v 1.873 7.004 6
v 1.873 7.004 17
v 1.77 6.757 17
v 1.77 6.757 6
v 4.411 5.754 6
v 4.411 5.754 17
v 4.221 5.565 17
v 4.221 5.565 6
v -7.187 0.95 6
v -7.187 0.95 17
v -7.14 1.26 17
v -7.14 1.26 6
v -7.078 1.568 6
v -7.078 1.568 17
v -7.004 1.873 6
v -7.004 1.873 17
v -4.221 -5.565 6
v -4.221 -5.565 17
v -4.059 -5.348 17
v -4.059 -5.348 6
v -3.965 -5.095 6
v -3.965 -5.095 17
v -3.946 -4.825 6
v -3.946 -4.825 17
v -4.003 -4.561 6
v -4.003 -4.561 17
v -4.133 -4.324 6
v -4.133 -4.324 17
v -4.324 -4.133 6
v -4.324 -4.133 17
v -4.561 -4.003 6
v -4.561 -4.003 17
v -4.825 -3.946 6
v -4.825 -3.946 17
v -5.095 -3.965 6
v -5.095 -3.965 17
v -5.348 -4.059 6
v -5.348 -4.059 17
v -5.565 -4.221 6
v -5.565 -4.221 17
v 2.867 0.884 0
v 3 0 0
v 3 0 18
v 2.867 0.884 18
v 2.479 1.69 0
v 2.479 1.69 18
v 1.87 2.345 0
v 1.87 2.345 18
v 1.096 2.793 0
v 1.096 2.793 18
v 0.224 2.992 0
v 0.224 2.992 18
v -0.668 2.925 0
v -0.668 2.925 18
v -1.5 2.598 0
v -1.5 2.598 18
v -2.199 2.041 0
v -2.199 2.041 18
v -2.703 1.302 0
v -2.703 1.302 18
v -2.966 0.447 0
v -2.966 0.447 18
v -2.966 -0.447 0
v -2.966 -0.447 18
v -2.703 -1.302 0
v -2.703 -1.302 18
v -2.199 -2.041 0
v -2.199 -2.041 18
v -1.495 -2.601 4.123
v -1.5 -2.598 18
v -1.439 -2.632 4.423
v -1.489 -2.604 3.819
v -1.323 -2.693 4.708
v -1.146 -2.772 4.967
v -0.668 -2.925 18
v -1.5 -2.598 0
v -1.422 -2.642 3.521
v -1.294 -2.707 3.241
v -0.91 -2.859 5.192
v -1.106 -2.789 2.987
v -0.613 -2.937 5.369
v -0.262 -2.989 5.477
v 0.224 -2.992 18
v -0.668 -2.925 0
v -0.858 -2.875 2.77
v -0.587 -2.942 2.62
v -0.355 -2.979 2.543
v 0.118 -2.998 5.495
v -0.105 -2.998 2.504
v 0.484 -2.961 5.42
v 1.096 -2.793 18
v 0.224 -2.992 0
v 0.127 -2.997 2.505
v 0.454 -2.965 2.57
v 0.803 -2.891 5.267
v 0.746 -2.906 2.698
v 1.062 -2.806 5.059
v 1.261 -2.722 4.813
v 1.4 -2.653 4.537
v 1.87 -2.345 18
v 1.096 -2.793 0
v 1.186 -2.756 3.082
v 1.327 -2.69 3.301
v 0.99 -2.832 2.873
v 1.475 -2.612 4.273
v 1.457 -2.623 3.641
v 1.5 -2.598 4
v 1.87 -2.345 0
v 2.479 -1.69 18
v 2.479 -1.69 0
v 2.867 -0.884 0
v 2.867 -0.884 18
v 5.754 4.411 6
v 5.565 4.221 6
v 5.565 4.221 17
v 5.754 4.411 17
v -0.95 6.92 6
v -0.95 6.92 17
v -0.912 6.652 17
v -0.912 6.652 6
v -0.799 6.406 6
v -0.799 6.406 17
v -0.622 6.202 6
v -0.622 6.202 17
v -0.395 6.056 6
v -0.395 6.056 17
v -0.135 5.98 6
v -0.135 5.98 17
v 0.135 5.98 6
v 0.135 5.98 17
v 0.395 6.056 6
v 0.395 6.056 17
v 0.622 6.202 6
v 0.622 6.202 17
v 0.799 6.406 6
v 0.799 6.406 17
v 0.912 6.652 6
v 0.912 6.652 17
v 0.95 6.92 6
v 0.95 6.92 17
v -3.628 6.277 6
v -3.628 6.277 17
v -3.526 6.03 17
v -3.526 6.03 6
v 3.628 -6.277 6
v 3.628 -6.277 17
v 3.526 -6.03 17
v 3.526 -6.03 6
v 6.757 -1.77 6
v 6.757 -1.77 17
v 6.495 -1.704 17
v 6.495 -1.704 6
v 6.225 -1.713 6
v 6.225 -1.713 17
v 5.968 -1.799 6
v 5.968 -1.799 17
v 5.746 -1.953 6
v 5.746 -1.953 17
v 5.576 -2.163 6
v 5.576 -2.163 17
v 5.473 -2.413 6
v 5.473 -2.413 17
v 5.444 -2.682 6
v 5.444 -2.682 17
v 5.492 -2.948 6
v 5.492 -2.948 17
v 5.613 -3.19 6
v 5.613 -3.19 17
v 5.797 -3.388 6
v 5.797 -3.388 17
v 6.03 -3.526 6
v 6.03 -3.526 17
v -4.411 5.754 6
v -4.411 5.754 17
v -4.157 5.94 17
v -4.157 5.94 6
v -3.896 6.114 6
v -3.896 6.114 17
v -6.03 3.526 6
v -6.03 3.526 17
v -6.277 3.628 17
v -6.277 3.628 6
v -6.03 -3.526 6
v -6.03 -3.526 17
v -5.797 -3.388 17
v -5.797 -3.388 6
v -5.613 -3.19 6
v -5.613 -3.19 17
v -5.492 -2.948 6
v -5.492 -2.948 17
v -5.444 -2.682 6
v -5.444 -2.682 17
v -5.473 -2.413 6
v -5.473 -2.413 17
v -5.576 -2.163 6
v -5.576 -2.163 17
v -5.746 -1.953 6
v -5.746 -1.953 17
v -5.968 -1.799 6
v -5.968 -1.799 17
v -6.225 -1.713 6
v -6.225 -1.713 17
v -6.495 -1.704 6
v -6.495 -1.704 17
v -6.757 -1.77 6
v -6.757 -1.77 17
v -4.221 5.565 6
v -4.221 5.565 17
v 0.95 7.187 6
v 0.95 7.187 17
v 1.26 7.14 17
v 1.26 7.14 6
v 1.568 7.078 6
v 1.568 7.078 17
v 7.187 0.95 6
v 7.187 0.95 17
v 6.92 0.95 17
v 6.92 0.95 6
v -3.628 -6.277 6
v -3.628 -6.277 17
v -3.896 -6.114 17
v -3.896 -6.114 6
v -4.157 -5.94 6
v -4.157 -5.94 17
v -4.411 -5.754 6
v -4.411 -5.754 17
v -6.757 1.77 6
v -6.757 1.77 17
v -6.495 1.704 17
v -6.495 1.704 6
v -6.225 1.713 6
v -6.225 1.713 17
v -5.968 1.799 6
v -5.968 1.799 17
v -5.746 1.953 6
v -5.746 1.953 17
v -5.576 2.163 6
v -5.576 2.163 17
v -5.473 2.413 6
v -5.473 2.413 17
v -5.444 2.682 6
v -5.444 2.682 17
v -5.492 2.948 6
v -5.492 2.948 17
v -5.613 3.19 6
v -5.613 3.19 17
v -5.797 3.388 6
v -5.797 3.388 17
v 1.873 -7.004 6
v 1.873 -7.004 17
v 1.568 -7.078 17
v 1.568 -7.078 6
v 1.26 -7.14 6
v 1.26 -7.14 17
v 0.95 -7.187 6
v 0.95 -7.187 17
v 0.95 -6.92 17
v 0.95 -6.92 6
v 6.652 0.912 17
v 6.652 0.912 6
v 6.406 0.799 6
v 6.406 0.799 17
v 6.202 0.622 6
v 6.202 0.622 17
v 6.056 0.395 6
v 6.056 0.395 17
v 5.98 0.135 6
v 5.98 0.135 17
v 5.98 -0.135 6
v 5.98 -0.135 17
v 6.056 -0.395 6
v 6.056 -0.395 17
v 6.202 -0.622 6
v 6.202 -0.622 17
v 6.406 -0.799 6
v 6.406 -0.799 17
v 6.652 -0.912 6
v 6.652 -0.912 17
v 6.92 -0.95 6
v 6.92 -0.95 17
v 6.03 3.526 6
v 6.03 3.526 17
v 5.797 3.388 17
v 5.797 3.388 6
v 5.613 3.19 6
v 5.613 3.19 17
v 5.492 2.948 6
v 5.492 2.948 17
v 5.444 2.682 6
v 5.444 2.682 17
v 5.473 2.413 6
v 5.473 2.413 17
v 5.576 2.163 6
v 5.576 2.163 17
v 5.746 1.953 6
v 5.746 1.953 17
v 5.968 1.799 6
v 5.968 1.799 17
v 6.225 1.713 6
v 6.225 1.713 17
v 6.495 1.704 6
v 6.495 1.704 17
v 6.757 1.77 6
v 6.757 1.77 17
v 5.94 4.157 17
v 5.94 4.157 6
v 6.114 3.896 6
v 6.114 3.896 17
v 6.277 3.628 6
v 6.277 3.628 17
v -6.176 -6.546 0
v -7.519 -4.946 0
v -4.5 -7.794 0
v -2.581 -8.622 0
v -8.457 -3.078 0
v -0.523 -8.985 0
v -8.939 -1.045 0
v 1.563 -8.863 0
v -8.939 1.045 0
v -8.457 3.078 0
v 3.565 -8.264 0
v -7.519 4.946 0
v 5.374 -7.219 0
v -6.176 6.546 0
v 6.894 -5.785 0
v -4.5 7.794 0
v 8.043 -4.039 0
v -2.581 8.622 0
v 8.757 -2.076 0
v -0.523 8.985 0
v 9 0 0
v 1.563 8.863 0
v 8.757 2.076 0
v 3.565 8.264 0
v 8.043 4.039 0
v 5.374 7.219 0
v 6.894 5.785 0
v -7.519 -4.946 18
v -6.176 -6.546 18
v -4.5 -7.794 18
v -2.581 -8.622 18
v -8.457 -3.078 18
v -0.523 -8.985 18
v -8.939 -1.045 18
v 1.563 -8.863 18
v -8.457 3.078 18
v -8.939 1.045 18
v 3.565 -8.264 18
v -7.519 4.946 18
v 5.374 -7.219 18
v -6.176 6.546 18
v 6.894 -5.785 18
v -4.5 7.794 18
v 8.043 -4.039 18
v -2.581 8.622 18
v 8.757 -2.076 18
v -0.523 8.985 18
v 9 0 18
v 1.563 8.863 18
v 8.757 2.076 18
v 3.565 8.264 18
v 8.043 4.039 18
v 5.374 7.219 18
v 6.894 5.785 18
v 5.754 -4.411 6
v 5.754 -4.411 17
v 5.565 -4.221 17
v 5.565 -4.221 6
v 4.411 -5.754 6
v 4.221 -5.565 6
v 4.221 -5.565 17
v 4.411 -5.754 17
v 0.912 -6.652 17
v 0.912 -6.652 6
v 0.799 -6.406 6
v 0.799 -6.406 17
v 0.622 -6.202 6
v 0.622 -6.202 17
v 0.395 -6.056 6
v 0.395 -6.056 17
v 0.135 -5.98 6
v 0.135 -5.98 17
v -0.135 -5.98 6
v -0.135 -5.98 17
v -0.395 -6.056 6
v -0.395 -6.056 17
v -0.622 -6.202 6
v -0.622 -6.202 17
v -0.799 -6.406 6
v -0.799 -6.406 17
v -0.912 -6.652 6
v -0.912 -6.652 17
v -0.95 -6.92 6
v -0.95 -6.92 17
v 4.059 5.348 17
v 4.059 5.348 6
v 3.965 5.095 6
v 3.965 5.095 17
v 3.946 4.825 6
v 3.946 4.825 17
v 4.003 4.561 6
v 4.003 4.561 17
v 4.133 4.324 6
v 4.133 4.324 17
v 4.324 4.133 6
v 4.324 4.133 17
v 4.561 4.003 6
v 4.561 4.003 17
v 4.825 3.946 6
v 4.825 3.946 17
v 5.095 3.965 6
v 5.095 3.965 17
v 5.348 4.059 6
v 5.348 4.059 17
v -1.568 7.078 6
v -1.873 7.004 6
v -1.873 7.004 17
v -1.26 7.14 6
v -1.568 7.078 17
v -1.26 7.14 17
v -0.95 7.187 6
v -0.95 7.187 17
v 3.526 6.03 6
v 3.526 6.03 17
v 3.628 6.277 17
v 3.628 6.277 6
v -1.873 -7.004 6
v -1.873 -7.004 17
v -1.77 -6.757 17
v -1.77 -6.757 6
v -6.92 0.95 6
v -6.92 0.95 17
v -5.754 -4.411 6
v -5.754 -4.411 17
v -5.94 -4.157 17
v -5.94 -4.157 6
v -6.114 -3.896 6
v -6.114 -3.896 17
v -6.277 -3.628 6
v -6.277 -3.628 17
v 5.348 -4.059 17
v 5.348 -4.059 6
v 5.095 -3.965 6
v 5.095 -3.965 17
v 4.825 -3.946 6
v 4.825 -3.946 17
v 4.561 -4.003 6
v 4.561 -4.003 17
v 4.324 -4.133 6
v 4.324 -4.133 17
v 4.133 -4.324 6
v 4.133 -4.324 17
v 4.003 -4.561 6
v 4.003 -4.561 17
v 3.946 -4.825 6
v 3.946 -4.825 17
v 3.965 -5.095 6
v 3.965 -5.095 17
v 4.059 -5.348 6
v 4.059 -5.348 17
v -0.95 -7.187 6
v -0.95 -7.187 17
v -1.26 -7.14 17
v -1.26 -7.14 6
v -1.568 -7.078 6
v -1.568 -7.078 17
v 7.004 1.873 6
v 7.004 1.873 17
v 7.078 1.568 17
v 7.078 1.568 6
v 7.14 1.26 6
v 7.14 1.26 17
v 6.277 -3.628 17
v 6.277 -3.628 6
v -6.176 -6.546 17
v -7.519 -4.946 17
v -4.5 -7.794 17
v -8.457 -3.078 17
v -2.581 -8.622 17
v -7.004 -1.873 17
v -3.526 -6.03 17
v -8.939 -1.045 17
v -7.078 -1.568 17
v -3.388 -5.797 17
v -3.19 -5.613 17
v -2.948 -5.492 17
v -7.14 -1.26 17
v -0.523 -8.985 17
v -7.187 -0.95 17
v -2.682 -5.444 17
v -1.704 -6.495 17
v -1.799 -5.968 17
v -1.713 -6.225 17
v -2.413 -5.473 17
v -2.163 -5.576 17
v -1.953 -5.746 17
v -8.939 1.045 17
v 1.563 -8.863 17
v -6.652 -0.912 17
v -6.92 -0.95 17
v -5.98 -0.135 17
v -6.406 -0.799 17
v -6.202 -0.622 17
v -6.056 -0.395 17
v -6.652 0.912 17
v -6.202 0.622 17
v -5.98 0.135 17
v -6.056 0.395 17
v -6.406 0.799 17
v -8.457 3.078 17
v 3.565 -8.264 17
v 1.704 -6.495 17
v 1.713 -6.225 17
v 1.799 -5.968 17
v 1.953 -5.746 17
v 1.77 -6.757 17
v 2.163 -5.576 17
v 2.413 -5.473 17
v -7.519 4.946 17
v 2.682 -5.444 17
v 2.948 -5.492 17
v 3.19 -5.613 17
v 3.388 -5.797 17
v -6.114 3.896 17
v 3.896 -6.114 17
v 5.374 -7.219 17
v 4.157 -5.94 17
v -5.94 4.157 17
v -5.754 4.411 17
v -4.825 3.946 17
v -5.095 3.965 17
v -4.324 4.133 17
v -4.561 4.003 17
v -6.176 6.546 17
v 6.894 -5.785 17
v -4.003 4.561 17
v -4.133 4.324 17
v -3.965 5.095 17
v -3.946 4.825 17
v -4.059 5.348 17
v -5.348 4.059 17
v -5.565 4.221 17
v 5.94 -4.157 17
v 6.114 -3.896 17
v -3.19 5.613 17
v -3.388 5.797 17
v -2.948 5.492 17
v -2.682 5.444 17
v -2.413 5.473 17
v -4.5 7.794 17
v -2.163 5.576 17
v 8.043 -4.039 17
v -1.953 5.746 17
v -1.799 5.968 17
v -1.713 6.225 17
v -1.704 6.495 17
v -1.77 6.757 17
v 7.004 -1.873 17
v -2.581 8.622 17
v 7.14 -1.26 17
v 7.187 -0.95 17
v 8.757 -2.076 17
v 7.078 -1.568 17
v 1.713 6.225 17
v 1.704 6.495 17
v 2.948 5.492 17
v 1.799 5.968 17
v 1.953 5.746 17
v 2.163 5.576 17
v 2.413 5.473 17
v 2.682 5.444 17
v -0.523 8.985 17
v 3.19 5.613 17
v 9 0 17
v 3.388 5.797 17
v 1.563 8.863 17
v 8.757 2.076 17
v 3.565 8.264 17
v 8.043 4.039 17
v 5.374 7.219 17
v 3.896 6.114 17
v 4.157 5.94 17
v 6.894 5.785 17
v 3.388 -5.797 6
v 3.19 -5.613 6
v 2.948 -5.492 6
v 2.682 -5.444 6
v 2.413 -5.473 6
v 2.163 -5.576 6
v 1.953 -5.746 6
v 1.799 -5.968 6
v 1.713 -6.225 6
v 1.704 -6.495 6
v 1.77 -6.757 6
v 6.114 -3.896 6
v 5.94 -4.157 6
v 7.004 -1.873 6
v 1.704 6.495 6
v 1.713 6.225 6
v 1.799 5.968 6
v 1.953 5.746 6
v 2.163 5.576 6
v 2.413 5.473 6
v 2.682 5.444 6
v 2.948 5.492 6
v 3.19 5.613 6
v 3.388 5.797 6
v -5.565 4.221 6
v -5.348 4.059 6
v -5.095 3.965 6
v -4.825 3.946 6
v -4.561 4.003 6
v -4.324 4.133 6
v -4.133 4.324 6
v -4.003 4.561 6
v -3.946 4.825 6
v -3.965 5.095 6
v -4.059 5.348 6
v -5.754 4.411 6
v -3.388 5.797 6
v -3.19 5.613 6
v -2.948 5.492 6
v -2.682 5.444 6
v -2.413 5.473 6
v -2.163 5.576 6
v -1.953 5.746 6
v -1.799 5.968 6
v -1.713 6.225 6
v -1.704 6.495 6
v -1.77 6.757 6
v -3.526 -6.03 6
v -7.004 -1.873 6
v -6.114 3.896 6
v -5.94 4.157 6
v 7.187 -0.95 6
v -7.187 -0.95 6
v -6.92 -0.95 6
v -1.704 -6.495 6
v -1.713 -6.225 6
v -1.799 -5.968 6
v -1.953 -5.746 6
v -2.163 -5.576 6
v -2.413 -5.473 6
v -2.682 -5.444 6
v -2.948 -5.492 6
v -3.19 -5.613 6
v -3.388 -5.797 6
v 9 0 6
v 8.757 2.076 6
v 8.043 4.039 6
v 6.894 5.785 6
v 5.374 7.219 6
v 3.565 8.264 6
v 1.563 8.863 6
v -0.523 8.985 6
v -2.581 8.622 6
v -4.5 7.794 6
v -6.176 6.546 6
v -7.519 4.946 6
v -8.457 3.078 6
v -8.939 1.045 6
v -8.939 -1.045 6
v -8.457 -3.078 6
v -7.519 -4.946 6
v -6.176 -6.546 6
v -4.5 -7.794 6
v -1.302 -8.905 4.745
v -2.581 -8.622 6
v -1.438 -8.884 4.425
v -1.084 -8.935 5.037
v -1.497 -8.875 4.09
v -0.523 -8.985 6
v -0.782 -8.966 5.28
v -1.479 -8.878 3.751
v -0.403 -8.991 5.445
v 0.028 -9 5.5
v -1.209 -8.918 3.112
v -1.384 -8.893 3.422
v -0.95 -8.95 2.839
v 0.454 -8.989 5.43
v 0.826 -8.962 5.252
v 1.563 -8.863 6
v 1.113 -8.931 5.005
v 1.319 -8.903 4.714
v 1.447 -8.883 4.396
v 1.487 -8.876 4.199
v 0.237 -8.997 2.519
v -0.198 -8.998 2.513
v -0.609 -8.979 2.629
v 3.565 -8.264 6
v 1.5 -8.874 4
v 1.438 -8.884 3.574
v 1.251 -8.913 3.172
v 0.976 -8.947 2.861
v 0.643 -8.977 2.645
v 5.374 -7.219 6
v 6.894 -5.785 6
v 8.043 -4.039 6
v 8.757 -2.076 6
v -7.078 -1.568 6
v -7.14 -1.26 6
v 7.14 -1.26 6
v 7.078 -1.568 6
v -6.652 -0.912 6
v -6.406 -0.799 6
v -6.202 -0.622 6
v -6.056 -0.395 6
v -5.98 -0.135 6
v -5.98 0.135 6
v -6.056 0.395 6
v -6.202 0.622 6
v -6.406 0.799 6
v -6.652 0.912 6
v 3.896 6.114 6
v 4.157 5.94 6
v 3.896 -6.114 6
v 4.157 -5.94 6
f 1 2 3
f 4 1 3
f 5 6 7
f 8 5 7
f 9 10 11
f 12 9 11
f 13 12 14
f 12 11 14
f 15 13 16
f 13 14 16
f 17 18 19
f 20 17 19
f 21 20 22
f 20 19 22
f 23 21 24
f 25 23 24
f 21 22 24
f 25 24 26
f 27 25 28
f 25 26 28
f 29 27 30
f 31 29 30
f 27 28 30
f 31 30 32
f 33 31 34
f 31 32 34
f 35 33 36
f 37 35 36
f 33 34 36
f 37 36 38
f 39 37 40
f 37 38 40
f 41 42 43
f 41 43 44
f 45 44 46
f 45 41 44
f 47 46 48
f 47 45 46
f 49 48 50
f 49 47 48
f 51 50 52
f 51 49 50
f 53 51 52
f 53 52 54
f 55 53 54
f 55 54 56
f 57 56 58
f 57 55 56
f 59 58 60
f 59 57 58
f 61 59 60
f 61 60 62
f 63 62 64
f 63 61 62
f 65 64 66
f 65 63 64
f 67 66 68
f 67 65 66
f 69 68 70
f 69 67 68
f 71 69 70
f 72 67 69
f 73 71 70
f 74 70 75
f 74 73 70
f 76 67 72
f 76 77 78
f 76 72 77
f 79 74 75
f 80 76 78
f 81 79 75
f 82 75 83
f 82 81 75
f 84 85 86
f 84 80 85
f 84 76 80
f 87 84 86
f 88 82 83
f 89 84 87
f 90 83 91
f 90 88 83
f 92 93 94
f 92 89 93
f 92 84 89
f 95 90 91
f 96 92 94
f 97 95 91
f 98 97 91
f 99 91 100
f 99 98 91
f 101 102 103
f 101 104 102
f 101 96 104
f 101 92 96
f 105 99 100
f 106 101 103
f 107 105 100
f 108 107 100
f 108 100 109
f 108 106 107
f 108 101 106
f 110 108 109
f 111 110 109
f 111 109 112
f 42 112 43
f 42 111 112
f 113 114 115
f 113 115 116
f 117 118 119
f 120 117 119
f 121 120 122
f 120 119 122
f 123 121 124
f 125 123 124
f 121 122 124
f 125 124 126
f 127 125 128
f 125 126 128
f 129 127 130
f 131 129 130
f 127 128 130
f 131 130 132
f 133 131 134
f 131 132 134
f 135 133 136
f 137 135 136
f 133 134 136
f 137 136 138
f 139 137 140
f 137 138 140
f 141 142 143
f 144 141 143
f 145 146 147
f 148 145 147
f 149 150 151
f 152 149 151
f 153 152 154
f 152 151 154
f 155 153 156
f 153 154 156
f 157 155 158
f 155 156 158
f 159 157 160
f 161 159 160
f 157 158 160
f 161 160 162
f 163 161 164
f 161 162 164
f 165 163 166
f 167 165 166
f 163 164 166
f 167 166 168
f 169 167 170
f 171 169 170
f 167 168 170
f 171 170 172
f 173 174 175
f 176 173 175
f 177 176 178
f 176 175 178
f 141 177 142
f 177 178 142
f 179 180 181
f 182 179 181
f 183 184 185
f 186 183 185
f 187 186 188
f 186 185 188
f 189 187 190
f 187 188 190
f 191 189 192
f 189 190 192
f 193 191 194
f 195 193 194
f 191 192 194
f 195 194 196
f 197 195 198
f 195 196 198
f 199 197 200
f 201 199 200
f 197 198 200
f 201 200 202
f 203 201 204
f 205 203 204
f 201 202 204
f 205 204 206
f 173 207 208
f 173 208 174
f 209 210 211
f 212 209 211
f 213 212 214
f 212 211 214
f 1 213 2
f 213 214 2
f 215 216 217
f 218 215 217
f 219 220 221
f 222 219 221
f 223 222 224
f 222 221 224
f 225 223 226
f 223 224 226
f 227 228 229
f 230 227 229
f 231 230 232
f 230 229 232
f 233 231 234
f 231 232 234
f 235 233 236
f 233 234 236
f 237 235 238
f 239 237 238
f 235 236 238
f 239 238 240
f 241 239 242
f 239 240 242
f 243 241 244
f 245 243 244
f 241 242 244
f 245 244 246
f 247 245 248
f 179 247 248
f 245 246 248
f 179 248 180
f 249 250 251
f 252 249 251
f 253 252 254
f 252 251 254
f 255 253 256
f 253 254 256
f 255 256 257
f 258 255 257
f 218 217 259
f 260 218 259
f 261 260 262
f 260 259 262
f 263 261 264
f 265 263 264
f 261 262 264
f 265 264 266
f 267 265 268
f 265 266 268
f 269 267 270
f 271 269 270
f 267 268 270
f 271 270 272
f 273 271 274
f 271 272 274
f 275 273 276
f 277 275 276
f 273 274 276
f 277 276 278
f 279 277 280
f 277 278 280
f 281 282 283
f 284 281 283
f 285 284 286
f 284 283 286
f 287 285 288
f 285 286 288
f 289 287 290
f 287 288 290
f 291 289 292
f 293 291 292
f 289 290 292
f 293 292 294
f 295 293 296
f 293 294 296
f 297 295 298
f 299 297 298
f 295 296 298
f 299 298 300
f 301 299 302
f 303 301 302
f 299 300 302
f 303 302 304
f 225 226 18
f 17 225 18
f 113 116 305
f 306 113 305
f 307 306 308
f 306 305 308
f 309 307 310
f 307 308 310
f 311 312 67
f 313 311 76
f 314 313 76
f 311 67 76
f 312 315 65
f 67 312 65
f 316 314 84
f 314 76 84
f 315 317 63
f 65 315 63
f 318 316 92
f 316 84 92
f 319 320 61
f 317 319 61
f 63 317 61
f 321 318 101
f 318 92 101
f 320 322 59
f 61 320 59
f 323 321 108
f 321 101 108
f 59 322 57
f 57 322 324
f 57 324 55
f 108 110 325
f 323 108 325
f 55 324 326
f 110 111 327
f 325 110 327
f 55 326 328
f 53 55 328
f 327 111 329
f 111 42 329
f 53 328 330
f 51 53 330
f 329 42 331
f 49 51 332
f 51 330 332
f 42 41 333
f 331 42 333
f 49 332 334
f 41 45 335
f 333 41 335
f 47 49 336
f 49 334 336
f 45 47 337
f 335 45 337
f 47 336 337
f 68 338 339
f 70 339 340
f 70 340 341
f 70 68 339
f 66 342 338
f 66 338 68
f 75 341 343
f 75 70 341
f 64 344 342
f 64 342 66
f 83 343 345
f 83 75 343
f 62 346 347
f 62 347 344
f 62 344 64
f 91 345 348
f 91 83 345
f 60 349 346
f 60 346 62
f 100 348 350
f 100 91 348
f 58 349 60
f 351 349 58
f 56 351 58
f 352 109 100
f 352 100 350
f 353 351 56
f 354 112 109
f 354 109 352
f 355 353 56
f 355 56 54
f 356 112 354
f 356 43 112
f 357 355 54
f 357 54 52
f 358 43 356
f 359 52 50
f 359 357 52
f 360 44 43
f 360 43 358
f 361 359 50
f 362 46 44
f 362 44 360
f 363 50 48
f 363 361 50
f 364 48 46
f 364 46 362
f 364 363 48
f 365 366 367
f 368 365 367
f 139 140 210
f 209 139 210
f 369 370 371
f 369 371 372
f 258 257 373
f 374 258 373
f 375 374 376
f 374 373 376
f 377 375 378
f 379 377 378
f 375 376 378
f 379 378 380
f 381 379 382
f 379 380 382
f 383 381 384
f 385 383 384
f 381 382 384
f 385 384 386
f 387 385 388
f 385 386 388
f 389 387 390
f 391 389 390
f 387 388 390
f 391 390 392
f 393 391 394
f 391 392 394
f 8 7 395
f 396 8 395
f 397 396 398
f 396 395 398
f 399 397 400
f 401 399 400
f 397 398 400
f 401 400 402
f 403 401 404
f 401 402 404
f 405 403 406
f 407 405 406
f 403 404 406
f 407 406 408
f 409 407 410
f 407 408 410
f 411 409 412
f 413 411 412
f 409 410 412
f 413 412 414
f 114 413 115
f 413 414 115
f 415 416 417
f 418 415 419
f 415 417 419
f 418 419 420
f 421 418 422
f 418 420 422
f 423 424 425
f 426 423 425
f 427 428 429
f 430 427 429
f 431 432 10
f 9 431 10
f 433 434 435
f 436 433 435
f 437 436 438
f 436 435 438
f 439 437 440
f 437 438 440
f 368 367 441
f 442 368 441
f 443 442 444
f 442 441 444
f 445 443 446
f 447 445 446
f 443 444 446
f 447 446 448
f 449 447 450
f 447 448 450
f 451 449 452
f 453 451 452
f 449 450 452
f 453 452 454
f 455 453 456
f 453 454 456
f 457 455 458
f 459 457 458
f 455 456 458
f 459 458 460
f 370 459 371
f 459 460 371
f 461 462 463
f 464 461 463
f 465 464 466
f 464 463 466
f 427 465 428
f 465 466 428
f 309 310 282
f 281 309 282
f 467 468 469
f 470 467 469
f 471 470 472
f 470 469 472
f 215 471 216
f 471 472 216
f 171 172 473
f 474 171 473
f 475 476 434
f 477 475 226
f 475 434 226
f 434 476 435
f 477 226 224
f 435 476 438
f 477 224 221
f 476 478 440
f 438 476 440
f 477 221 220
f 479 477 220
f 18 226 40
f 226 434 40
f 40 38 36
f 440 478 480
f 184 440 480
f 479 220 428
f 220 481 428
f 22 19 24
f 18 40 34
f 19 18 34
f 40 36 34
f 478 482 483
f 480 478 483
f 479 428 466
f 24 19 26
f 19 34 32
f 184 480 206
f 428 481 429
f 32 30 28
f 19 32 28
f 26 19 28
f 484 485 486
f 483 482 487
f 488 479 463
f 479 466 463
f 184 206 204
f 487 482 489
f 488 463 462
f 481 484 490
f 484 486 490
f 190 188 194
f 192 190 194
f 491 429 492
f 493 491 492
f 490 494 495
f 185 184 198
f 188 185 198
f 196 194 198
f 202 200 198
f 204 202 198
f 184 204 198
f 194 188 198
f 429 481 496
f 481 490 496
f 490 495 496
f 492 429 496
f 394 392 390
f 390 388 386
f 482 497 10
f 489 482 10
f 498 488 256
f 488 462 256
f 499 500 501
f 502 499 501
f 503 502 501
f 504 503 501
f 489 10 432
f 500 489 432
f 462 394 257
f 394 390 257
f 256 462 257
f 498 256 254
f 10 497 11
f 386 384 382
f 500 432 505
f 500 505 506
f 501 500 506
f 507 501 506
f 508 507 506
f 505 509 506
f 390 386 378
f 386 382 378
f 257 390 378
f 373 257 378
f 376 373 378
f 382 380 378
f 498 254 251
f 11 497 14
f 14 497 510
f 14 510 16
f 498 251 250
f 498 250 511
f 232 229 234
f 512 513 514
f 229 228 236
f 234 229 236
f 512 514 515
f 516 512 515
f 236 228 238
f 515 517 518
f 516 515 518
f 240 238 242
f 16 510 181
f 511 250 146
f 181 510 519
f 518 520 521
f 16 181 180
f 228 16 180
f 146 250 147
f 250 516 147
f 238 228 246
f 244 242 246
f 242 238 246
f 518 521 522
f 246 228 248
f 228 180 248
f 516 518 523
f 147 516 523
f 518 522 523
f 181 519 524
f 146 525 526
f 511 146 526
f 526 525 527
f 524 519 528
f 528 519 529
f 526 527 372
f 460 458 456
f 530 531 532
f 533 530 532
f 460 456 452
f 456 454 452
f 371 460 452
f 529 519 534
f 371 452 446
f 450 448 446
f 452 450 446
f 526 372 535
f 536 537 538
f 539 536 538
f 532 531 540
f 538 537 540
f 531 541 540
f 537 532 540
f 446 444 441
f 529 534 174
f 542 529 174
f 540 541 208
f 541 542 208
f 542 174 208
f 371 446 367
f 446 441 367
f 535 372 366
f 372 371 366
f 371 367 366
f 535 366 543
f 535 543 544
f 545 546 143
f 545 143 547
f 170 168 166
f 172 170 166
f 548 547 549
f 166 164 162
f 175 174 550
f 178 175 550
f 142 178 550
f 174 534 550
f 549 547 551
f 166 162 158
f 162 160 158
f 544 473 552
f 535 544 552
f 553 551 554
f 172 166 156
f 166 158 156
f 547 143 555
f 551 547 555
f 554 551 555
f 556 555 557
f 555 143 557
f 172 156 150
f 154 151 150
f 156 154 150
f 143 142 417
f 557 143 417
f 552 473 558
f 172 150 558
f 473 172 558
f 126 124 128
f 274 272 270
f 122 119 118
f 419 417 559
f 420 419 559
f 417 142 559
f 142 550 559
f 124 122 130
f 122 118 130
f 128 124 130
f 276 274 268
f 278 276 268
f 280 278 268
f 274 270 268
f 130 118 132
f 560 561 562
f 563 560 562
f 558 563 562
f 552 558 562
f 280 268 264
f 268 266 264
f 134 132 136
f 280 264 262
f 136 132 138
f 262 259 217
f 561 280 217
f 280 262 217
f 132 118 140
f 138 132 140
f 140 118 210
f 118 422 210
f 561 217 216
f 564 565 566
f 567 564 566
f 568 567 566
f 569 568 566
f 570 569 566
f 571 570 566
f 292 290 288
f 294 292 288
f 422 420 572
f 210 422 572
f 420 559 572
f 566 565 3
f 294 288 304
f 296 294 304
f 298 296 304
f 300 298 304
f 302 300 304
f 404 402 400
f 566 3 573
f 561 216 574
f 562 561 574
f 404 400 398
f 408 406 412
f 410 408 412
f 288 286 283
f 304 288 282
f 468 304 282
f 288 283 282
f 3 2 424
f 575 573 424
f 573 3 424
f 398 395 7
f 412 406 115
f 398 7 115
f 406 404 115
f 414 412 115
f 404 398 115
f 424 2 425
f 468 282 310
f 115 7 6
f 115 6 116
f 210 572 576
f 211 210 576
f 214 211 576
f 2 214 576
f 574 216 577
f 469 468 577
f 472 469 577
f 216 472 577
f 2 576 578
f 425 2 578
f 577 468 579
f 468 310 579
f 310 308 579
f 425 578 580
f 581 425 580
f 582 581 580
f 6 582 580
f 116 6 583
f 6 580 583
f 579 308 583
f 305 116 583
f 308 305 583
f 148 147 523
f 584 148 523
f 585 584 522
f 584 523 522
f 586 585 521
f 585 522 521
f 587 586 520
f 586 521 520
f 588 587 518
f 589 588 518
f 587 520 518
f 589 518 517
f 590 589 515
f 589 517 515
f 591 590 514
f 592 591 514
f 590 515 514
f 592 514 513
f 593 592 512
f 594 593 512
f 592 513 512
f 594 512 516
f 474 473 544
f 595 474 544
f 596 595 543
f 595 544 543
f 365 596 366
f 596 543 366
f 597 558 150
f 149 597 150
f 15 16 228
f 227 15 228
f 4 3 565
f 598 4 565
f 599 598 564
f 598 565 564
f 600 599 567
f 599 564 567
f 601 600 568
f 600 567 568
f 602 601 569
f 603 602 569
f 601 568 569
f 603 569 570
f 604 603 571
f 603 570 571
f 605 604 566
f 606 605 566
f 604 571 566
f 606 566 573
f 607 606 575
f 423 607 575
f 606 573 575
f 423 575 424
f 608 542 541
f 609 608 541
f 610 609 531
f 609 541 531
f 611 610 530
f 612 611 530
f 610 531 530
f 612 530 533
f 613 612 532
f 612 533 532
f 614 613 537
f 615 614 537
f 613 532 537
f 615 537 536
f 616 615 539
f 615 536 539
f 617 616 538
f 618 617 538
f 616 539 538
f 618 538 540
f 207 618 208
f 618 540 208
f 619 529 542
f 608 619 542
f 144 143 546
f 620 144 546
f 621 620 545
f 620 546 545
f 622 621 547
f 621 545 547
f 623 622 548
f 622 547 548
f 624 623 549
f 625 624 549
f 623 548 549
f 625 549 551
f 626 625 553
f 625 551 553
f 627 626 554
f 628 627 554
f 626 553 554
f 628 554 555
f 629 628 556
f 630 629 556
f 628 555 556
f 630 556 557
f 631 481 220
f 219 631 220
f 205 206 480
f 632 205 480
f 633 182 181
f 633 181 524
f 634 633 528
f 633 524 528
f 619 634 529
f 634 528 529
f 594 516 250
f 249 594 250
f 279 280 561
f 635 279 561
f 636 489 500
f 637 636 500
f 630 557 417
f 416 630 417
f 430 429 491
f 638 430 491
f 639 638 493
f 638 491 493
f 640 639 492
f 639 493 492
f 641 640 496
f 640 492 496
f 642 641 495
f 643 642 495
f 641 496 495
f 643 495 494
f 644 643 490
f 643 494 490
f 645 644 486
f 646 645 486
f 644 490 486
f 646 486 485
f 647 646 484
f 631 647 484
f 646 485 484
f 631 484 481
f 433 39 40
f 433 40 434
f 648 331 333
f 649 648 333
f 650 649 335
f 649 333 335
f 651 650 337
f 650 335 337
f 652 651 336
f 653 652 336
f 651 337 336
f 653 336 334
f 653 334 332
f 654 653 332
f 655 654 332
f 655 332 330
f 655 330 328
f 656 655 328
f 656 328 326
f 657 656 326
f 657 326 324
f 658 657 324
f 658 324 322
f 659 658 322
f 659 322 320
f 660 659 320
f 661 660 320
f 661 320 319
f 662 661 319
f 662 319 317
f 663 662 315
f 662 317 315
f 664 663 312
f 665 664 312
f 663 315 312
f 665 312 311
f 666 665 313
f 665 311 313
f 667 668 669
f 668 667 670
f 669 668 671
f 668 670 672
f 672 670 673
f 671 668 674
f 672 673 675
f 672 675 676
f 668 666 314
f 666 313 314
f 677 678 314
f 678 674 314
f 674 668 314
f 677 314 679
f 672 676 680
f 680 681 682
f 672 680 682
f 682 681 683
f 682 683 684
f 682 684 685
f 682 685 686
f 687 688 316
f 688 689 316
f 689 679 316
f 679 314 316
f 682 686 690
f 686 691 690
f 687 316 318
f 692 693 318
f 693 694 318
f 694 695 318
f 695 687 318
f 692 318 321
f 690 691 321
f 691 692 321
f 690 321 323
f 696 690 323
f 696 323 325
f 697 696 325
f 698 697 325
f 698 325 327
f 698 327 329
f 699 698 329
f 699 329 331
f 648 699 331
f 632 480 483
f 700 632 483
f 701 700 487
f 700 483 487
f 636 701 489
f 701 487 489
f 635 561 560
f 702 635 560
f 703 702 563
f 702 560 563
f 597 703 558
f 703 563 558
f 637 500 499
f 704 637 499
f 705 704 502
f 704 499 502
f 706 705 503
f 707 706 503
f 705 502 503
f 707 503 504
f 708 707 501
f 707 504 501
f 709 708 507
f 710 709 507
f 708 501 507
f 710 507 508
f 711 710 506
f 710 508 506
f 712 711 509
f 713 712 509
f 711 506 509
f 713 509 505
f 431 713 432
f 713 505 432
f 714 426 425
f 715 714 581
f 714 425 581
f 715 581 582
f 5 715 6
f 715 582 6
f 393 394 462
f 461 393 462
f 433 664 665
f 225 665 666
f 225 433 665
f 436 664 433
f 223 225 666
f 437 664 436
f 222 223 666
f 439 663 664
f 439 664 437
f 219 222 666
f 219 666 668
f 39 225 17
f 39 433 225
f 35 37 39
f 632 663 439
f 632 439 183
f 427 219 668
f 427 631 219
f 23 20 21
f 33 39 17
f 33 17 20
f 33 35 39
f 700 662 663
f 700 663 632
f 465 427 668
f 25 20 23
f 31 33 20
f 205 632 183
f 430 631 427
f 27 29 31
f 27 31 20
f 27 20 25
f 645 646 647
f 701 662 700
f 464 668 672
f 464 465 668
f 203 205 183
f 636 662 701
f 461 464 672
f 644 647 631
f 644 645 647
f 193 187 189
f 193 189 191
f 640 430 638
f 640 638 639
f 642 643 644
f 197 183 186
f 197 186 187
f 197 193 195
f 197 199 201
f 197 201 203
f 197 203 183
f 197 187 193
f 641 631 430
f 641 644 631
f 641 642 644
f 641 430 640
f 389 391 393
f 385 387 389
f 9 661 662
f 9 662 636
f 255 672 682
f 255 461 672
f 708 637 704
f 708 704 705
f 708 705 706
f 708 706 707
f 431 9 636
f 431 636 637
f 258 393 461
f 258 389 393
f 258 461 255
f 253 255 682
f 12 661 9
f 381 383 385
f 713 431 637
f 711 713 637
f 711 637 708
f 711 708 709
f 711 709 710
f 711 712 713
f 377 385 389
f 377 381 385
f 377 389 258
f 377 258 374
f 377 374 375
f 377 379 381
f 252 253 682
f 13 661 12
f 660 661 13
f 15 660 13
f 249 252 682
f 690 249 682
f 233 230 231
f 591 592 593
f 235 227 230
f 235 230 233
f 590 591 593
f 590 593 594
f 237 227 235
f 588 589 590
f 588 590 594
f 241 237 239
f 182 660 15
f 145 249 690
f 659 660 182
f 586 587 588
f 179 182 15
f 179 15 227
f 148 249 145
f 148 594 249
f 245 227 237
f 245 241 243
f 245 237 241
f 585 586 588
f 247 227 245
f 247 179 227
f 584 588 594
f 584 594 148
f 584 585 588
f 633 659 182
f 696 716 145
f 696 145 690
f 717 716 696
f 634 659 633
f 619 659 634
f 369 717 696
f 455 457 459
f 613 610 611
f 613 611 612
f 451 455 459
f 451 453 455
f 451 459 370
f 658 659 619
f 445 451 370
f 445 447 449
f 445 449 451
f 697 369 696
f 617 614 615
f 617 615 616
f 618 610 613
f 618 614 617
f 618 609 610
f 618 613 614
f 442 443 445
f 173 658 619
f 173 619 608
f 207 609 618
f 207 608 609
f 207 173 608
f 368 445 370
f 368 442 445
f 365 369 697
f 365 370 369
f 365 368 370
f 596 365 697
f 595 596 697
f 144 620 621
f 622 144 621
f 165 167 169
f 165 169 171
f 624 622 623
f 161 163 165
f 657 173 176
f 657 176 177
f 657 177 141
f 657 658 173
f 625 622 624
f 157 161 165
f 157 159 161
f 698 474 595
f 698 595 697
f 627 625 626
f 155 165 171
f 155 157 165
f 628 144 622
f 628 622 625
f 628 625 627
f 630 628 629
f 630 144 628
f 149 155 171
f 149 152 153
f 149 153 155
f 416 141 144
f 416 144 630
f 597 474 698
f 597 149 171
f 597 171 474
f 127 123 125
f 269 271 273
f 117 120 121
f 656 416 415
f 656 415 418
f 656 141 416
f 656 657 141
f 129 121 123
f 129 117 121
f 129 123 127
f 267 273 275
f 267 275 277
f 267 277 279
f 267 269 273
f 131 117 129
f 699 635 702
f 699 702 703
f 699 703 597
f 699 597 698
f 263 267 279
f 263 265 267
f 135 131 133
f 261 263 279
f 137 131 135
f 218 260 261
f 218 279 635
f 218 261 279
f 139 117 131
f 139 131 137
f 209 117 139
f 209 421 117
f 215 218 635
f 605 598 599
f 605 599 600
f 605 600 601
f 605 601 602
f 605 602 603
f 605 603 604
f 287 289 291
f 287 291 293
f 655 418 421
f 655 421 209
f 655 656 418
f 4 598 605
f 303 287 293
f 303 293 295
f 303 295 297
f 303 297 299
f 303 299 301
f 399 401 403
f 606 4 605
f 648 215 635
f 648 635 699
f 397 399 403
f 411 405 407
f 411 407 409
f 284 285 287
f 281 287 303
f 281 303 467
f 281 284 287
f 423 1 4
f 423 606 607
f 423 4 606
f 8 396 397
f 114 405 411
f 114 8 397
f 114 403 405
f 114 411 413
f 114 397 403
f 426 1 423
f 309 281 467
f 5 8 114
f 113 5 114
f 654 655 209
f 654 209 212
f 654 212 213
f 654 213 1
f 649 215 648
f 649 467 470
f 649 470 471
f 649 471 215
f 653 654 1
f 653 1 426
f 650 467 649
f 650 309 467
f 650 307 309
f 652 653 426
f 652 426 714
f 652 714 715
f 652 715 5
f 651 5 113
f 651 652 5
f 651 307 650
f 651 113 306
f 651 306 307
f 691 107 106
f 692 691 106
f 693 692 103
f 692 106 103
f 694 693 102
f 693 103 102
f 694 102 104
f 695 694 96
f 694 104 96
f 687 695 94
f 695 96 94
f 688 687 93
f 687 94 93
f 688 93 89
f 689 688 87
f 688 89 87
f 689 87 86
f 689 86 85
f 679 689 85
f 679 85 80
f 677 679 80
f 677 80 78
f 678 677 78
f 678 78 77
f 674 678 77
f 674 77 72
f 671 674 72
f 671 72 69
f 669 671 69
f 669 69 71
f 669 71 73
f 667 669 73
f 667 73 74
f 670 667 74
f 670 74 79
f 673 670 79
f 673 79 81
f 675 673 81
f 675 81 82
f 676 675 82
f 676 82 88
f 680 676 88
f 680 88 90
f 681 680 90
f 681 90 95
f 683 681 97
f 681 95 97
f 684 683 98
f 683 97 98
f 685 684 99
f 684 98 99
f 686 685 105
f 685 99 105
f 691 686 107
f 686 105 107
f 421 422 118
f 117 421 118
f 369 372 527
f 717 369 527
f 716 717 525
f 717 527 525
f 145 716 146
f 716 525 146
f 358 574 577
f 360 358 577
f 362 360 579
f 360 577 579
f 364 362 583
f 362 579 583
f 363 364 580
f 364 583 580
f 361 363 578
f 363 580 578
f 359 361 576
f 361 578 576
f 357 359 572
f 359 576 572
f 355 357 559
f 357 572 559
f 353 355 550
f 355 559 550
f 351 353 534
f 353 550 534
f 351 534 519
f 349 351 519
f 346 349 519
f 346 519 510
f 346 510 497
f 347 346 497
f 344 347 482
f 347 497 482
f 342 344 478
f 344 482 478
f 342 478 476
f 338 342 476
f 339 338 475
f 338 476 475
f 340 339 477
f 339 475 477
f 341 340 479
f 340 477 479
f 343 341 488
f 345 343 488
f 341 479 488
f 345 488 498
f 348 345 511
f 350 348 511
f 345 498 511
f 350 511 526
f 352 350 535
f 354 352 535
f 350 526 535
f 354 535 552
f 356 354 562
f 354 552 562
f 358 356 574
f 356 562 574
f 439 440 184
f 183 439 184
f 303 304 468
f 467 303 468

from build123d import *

# Parameters (mm, degrees)
SKETCH1_R           = 9
SKETCH1_R_2         = 3
BOSS_EXTRUDE1_DEPTH = 6
SKETCH2_R           = 7.25
SKETCH2_R_2         = 3
BOSS_EXTRUDE2_DEPTH = 11
SKETCH3_R           = 9
SKETCH3_R_2         = 3
BOSS_EXTRUDE3_DEPTH = 1
SKETCH4_R           = 1.5
CUT_EXTRUDE1_DEPTH  = 10
CUT_EXTRUDE4_START  = -1
SKETCH5_R           = 9
CUT_EXTRUDE4_DEPTH  = 11


with BuildPart() as part:
    # Sketch1 → Boss-Extrude1 (new body)
    with BuildSketch(Plane.XY):
        Circle(SKETCH1_R)
        Circle(SKETCH1_R_2, mode=Mode.SUBTRACT)
    extrude(amount=BOSS_EXTRUDE1_DEPTH)

    # Sketch2 → Boss-Extrude2 (add)
    with BuildSketch(Plane.XY.offset(6)):
        Circle(SKETCH2_R)
        Circle(SKETCH2_R_2, mode=Mode.SUBTRACT)
    extrude(amount=BOSS_EXTRUDE2_DEPTH)

    # Sketch3 → Boss-Extrude3 (add)
    with BuildSketch(Plane.XY.offset(17)):
        Circle(SKETCH3_R)
        Circle(SKETCH3_R_2, mode=Mode.SUBTRACT)
    extrude(amount=BOSS_EXTRUDE3_DEPTH)

    # Sketch4 → Cut-Extrude1 (cut, through all)
    with BuildSketch(Plane(origin=(0, 0, 0), x_dir=(1, 0, 0), z_dir=(0, 1, 0))):
        with Locations((0, -4)):
            Circle(SKETCH4_R)
    extrude(amount=-CUT_EXTRUDE1_DEPTH, mode=Mode.SUBTRACT)

    # Sketch5 → Cut-Extrude4 (cut)
    with BuildSketch(Plane.XY.offset(18).offset(CUT_EXTRUDE4_START)):
        Circle(SKETCH5_R)
        with BuildLine():
            Line((-0.95, 7.18748913), (-0.95, 6.92))
            ThreePointArc((-0.95, 6.92), (0, 5.97), (0.95, 6.92))
            Line((0.95, 6.92), (0.95, 7.18748913))
            ThreePointArc((0.95, 7.18748913), (1.414404835, 7.110693283), (1.872847455, 7.003923358))
            Line((1.872847455, 7.003923358), (1.770483796, 6.756795626))
            ThreePointArc((1.770483796, 6.756795626), (2.284620091, 5.515560809), (3.525854908, 6.029697104))
            Line((3.525854908, 6.029697104), (3.628218566, 6.276824837))
            ThreePointArc((3.628218566, 6.276824837), (4.027884188, 6.028154687), (4.410570862, 5.754073746))
            Line((4.410570862, 5.754073746), (4.221427484, 5.564930368))
            ThreePointArc((4.221427484, 5.564930368), (4.221427484, 4.221427484), (5.564930368, 4.221427484))
            Line((5.564930368, 4.221427484), (5.754073746, 4.410570862))
            ThreePointArc((5.754073746, 4.410570862), (6.028154689, 4.027884189), (6.276824837, 3.628218566))
            Line((6.276824837, 3.628218566), (6.029697104, 3.525854908))
            ThreePointArc((6.029697104, 3.525854908), (5.515560809, 2.284620091), (6.756795626, 1.770483796))
            Line((6.756795626, 1.770483796), (7.003923358, 1.872847455))
            ThreePointArc((7.003923358, 1.872847455), (7.110693283, 1.414404835), (7.18748913, 0.95))
            Line((7.18748913, 0.95), (6.92, 0.95))
            ThreePointArc((6.92, 0.95), (5.97, 0), (6.92, -0.95))
            Line((6.92, -0.95), (7.18748913, -0.95))
            ThreePointArc((7.18748913, -0.95), (7.110693283, -1.414404835), (7.003923358, -1.872847455))
            Line((7.003923358, -1.872847455), (6.756795626, -1.770483796))
            ThreePointArc((6.756795626, -1.770483796), (5.515560809, -2.284620091), (6.029697104, -3.525854908))
            Line((6.029697104, -3.525854908), (6.276824837, -3.628218566))
            ThreePointArc((6.276824837, -3.628218566), (6.028154689, -4.027884189), (5.754073746, -4.410570862))
            Line((5.754073746, -4.410570862), (5.564930368, -4.221427484))
            ThreePointArc((5.564930368, -4.221427484), (4.221427484, -4.221427484), (4.221427484, -5.564930368))
            Line((4.221427484, -5.564930368), (4.410570862, -5.754073746))
            ThreePointArc((4.410570862, -5.754073746), (4.027884189, -6.028154689), (3.628218566, -6.276824837))
            Line((3.628218566, -6.276824837), (3.525854908, -6.029697104))
            ThreePointArc((3.525854908, -6.029697104), (2.284620091, -5.515560809), (1.770483796, -6.756795626))
            Line((1.770483796, -6.756795626), (1.872847455, -7.003923358))
            ThreePointArc((1.872847455, -7.003923358), (1.414404835, -7.110693283), (0.95, -7.18748913))
            Line((0.95, -7.18748913), (0.95, -6.92))
            ThreePointArc((0.95, -6.92), (0, -5.97), (-0.95, -6.92))
            Line((-0.95, -6.92), (-0.95, -7.18748913))
            ThreePointArc((-0.95, -7.18748913), (-1.414404835, -7.110693283), (-1.872847455, -7.003923358))
            Line((-1.872847455, -7.003923358), (-1.770483796, -6.756795626))
            ThreePointArc((-1.770483796, -6.756795626), (-2.284620091, -5.515560809), (-3.525854908, -6.029697104))
            Line((-3.525854908, -6.029697104), (-3.628218566, -6.276824837))
            ThreePointArc((-3.628218566, -6.276824837), (-4.027884189, -6.028154689), (-4.410570862, -5.754073746))
            Line((-4.410570862, -5.754073746), (-4.221427484, -5.564930368))
            ThreePointArc((-4.221427484, -5.564930368), (-4.221427484, -4.221427484), (-5.564930368, -4.221427484))
            Line((-5.564930368, -4.221427484), (-5.754073746, -4.410570862))
            ThreePointArc((-5.754073746, -4.410570862), (-6.028154689, -4.027884189), (-6.276824837, -3.628218566))
            Line((-6.276824837, -3.628218566), (-6.029697104, -3.525854908))
            ThreePointArc((-6.029697104, -3.525854908), (-5.515560809, -2.284620091), (-6.756795626, -1.770483796))
            Line((-6.756795626, -1.770483796), (-7.003923358, -1.872847455))
            ThreePointArc((-7.003923358, -1.872847455), (-7.110693283, -1.414404835), (-7.18748913, -0.95))
            Line((-7.18748913, -0.95), (-6.92, -0.95))
            ThreePointArc((-6.92, -0.95), (-5.97, 0), (-6.92, 0.95))
            Line((-6.92, 0.95), (-7.18748913, 0.95))
            ThreePointArc((-7.18748913, 0.95), (-7.110693275, 1.414404833), (-7.003923358, 1.872847455))
            Line((-7.003923358, 1.872847455), (-6.756795626, 1.770483796))
            ThreePointArc((-6.756795626, 1.770483796), (-5.515560809, 2.284620091), (-6.029697104, 3.525854908))
            Line((-6.029697104, 3.525854908), (-6.276824837, 3.628218566))
            ThreePointArc((-6.276824837, 3.628218566), (-6.028154686, 4.027884187), (-5.754073746, 4.410570862))
            Line((-5.754073746, 4.410570862), (-5.564930368, 4.221427484))
            ThreePointArc((-5.564930368, 4.221427484), (-4.221427484, 4.221427484), (-4.221427484, 5.564930368))
            Line((-4.221427484, 5.564930368), (-4.410570862, 5.754073746))
            ThreePointArc((-4.410570862, 5.754073746), (-4.027884189, 6.028154689), (-3.628218566, 6.276824837))
            Line((-3.628218566, 6.276824837), (-3.525854908, 6.029697104))
            ThreePointArc((-3.525854908, 6.029697104), (-2.284620091, 5.515560809), (-1.770483796, 6.756795626))
            Line((-1.770483796, 6.756795626), (-1.872847455, 7.003923358))
            ThreePointArc((-1.872847455, 7.003923358), (-1.414404834, 7.11069328), (-0.95, 7.18748913))
        make_face(mode=Mode.SUBTRACT)
    extrude(amount=-CUT_EXTRUDE4_DEPTH, mode=Mode.SUBTRACT)


solid = part.part
